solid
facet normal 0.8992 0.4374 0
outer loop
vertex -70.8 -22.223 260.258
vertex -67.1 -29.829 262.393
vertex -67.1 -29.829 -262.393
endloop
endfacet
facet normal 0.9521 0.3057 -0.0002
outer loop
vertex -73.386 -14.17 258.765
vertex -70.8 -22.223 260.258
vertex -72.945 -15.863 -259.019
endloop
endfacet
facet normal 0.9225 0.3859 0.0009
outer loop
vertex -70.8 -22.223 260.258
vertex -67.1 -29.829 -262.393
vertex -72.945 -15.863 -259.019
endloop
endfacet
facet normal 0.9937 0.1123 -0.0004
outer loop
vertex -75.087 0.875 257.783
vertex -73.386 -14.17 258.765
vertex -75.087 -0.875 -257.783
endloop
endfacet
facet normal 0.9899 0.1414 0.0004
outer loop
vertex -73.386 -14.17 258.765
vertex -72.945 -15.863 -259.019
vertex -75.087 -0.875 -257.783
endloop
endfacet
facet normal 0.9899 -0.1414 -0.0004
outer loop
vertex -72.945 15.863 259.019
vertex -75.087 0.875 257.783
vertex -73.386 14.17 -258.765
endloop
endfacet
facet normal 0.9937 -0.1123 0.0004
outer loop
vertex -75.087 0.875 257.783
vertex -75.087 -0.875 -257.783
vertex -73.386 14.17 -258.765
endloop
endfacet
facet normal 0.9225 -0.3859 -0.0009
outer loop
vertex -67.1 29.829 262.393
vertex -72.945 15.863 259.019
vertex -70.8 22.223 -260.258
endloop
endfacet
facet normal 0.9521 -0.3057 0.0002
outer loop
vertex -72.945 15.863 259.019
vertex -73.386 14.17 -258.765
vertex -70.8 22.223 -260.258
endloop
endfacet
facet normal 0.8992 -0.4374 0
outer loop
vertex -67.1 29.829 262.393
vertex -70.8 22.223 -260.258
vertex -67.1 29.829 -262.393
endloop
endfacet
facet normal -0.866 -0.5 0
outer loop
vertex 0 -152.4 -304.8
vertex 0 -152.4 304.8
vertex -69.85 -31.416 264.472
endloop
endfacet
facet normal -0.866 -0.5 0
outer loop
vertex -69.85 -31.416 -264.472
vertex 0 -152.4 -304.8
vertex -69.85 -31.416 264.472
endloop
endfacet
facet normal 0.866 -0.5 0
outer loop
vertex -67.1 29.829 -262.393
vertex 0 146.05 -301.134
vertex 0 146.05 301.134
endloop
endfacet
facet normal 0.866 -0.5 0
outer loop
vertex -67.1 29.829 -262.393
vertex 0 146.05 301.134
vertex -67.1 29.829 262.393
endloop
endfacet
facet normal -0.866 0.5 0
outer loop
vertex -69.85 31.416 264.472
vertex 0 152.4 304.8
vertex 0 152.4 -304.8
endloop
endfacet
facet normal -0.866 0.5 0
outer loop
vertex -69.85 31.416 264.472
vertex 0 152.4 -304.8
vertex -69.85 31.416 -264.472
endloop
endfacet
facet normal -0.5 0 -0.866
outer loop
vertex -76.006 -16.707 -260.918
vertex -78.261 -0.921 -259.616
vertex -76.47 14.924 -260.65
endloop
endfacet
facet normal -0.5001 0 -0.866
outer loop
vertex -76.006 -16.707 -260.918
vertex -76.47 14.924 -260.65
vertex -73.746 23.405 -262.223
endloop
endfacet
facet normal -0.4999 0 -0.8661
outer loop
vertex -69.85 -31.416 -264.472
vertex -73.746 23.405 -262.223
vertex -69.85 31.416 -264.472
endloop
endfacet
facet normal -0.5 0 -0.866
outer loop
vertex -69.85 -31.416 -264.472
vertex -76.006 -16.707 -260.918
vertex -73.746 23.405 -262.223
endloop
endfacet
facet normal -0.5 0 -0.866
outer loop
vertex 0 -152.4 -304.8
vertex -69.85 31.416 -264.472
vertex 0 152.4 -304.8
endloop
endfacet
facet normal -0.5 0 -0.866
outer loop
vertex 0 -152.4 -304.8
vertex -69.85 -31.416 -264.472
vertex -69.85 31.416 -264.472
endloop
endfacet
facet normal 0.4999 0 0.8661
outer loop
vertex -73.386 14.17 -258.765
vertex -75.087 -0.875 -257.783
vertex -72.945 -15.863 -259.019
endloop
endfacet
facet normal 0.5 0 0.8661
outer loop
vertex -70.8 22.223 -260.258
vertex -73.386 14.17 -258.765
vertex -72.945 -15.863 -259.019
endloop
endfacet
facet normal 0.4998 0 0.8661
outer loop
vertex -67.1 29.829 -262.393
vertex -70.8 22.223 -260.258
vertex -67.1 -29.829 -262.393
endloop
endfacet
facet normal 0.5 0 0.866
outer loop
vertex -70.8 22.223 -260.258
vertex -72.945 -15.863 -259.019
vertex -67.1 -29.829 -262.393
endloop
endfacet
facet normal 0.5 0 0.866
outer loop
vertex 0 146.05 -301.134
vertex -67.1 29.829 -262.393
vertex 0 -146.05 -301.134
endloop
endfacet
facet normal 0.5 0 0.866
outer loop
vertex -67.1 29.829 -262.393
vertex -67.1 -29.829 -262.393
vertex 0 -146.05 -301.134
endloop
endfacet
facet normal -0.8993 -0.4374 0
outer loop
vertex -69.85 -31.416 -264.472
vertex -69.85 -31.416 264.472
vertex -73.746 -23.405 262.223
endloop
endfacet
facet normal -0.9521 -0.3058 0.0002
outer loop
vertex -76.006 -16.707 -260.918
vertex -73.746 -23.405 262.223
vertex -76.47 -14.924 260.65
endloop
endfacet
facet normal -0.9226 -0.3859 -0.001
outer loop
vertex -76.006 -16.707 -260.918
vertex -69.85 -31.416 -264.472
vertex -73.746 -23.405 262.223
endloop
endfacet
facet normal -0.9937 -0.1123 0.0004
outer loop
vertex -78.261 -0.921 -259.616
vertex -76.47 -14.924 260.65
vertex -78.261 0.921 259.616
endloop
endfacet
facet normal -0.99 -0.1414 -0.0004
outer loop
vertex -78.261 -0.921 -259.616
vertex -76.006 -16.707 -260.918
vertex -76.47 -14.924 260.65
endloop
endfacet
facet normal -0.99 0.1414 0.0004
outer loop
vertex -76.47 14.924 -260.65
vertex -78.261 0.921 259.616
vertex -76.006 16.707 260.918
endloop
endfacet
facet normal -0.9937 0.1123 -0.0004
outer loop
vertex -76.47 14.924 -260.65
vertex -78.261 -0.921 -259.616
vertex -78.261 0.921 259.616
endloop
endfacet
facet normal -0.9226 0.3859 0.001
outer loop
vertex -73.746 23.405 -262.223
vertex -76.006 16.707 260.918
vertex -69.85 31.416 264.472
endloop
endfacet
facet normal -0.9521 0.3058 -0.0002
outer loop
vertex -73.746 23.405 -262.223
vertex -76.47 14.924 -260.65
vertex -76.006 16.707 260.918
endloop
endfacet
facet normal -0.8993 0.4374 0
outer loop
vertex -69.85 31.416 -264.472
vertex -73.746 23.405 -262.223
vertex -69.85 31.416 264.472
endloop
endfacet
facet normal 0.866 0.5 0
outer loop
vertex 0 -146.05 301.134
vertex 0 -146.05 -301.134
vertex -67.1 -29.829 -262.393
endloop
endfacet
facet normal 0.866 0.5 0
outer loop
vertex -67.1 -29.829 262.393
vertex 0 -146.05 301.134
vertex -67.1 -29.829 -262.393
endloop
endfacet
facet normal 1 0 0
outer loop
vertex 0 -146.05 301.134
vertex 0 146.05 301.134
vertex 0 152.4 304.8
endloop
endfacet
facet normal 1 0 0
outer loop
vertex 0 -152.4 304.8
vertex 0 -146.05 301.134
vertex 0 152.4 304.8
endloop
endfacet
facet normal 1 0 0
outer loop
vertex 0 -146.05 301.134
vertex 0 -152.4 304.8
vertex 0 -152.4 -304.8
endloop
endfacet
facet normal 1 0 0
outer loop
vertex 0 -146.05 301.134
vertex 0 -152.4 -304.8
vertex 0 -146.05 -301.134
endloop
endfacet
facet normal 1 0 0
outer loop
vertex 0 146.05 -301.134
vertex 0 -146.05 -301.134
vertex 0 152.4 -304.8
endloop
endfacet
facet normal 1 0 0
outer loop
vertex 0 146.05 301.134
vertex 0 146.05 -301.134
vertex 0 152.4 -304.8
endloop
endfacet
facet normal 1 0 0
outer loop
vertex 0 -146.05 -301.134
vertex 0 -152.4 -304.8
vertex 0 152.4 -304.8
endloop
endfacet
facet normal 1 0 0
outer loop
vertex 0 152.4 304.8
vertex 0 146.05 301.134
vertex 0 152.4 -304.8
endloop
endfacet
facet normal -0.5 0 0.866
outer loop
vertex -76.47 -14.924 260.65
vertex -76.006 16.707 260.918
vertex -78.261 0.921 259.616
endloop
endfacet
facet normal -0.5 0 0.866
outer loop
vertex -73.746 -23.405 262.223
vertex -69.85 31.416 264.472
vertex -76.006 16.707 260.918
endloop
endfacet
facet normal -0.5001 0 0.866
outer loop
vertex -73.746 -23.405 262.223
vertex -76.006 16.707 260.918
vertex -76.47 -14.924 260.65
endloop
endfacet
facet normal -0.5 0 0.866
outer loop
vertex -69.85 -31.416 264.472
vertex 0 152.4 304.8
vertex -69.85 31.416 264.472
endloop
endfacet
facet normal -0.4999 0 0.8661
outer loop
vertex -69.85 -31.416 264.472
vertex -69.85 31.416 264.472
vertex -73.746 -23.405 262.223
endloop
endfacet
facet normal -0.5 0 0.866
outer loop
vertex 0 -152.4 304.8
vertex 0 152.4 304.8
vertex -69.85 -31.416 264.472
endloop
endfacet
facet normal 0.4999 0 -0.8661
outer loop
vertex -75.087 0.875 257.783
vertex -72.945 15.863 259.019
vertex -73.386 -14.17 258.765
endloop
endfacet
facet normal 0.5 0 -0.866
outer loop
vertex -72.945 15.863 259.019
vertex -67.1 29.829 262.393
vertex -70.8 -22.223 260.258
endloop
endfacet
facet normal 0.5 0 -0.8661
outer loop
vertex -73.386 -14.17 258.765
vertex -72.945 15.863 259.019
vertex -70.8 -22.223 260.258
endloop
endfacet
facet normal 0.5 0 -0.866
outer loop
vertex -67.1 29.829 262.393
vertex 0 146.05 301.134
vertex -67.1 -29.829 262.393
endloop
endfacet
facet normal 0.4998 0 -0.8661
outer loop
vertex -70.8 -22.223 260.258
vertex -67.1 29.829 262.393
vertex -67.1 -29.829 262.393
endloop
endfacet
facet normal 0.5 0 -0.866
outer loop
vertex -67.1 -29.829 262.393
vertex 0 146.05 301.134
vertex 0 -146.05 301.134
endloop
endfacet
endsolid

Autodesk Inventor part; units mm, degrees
ref_plane "YZ Plane" through (0, 0, 0) normal (1, 0, 0) x (0, 1, 0)
ref_plane "XZ Plane" through (0, 0, 0) normal (0, 1, 0) x (-1, 0, 0)
ref_plane "XY Plane" through (0, 0, 0) normal (0, 0, 1) x (1, 0, 0)
sketch "Sketch1" plane through (0, 0, 0) normal (0, 0, 1) x (1, 0, 0)
  line L0 (-93.9216, 0) -> (15.6536, 0) projected
  line L1 (0, -306.9874) -> (0, 252.5784) projected
  line L2 (0, 152.4) -> (0, -152.4)
  line L3 (0, 152.4) -> (-69.85, 31.4163)
  line L4 (0, -152.4) -> (-69.85, -31.4163)
  arc A0 (-69.85, 31.4163) -> (-69.85, -31.4163) centre (-15.4355, 0) ccw
  line L5 (-78.268, 172.6404) -> (-78.268, -227.0494) construction
  point P0 (0, 0)
  point P1 (0, 0)
  dimension "d0" = 304.8
  dimension "d13" = 30
  dimension "d14" = 139.7
extrude "Extrusion1" add sketch "Sketch1" along normal mid plane 609.6
sketch "Sketch3" plane through (0, 0, 0) normal (0, 1, 0) x (-1, 0, 0)
  line L0 (69.85, 304.8) -> (0, 304.8) projected
  line L1 (0, -304.8) -> (0, 304.8) projected
  line L2 (69.85, 304.8) -> (69.85, 304.8) projected
  line L3 (69.85, -304.8) -> (69.85, 304.8) projected
  line L4 (69.85, -304.8) -> (69.85, -304.8) projected
  line L5 (69.85, -304.8) -> (69.85, 304.8) projected
  line L6 (78.268, -304.8) -> (78.268, 304.8) projected
  line L7 (69.85, 304.8) -> (78.268, 304.8) projected
  line L8 (0, 304.8) -> (78.268, 259.612)
  point P0 (0, 0)
  dimension "d8" = 30
extrude "Extrusion3" cut sketch "Sketch3" along normal through all both and the other way through all
mirror "Mirror1" about plane through (0, 0, 0) normal (0, 0, 1) of "Extrusion3"
shell "Shell1" thickness 3.175 removed faces 1 at (0, -50.8, -101.6)
properties part number "front bumper"
